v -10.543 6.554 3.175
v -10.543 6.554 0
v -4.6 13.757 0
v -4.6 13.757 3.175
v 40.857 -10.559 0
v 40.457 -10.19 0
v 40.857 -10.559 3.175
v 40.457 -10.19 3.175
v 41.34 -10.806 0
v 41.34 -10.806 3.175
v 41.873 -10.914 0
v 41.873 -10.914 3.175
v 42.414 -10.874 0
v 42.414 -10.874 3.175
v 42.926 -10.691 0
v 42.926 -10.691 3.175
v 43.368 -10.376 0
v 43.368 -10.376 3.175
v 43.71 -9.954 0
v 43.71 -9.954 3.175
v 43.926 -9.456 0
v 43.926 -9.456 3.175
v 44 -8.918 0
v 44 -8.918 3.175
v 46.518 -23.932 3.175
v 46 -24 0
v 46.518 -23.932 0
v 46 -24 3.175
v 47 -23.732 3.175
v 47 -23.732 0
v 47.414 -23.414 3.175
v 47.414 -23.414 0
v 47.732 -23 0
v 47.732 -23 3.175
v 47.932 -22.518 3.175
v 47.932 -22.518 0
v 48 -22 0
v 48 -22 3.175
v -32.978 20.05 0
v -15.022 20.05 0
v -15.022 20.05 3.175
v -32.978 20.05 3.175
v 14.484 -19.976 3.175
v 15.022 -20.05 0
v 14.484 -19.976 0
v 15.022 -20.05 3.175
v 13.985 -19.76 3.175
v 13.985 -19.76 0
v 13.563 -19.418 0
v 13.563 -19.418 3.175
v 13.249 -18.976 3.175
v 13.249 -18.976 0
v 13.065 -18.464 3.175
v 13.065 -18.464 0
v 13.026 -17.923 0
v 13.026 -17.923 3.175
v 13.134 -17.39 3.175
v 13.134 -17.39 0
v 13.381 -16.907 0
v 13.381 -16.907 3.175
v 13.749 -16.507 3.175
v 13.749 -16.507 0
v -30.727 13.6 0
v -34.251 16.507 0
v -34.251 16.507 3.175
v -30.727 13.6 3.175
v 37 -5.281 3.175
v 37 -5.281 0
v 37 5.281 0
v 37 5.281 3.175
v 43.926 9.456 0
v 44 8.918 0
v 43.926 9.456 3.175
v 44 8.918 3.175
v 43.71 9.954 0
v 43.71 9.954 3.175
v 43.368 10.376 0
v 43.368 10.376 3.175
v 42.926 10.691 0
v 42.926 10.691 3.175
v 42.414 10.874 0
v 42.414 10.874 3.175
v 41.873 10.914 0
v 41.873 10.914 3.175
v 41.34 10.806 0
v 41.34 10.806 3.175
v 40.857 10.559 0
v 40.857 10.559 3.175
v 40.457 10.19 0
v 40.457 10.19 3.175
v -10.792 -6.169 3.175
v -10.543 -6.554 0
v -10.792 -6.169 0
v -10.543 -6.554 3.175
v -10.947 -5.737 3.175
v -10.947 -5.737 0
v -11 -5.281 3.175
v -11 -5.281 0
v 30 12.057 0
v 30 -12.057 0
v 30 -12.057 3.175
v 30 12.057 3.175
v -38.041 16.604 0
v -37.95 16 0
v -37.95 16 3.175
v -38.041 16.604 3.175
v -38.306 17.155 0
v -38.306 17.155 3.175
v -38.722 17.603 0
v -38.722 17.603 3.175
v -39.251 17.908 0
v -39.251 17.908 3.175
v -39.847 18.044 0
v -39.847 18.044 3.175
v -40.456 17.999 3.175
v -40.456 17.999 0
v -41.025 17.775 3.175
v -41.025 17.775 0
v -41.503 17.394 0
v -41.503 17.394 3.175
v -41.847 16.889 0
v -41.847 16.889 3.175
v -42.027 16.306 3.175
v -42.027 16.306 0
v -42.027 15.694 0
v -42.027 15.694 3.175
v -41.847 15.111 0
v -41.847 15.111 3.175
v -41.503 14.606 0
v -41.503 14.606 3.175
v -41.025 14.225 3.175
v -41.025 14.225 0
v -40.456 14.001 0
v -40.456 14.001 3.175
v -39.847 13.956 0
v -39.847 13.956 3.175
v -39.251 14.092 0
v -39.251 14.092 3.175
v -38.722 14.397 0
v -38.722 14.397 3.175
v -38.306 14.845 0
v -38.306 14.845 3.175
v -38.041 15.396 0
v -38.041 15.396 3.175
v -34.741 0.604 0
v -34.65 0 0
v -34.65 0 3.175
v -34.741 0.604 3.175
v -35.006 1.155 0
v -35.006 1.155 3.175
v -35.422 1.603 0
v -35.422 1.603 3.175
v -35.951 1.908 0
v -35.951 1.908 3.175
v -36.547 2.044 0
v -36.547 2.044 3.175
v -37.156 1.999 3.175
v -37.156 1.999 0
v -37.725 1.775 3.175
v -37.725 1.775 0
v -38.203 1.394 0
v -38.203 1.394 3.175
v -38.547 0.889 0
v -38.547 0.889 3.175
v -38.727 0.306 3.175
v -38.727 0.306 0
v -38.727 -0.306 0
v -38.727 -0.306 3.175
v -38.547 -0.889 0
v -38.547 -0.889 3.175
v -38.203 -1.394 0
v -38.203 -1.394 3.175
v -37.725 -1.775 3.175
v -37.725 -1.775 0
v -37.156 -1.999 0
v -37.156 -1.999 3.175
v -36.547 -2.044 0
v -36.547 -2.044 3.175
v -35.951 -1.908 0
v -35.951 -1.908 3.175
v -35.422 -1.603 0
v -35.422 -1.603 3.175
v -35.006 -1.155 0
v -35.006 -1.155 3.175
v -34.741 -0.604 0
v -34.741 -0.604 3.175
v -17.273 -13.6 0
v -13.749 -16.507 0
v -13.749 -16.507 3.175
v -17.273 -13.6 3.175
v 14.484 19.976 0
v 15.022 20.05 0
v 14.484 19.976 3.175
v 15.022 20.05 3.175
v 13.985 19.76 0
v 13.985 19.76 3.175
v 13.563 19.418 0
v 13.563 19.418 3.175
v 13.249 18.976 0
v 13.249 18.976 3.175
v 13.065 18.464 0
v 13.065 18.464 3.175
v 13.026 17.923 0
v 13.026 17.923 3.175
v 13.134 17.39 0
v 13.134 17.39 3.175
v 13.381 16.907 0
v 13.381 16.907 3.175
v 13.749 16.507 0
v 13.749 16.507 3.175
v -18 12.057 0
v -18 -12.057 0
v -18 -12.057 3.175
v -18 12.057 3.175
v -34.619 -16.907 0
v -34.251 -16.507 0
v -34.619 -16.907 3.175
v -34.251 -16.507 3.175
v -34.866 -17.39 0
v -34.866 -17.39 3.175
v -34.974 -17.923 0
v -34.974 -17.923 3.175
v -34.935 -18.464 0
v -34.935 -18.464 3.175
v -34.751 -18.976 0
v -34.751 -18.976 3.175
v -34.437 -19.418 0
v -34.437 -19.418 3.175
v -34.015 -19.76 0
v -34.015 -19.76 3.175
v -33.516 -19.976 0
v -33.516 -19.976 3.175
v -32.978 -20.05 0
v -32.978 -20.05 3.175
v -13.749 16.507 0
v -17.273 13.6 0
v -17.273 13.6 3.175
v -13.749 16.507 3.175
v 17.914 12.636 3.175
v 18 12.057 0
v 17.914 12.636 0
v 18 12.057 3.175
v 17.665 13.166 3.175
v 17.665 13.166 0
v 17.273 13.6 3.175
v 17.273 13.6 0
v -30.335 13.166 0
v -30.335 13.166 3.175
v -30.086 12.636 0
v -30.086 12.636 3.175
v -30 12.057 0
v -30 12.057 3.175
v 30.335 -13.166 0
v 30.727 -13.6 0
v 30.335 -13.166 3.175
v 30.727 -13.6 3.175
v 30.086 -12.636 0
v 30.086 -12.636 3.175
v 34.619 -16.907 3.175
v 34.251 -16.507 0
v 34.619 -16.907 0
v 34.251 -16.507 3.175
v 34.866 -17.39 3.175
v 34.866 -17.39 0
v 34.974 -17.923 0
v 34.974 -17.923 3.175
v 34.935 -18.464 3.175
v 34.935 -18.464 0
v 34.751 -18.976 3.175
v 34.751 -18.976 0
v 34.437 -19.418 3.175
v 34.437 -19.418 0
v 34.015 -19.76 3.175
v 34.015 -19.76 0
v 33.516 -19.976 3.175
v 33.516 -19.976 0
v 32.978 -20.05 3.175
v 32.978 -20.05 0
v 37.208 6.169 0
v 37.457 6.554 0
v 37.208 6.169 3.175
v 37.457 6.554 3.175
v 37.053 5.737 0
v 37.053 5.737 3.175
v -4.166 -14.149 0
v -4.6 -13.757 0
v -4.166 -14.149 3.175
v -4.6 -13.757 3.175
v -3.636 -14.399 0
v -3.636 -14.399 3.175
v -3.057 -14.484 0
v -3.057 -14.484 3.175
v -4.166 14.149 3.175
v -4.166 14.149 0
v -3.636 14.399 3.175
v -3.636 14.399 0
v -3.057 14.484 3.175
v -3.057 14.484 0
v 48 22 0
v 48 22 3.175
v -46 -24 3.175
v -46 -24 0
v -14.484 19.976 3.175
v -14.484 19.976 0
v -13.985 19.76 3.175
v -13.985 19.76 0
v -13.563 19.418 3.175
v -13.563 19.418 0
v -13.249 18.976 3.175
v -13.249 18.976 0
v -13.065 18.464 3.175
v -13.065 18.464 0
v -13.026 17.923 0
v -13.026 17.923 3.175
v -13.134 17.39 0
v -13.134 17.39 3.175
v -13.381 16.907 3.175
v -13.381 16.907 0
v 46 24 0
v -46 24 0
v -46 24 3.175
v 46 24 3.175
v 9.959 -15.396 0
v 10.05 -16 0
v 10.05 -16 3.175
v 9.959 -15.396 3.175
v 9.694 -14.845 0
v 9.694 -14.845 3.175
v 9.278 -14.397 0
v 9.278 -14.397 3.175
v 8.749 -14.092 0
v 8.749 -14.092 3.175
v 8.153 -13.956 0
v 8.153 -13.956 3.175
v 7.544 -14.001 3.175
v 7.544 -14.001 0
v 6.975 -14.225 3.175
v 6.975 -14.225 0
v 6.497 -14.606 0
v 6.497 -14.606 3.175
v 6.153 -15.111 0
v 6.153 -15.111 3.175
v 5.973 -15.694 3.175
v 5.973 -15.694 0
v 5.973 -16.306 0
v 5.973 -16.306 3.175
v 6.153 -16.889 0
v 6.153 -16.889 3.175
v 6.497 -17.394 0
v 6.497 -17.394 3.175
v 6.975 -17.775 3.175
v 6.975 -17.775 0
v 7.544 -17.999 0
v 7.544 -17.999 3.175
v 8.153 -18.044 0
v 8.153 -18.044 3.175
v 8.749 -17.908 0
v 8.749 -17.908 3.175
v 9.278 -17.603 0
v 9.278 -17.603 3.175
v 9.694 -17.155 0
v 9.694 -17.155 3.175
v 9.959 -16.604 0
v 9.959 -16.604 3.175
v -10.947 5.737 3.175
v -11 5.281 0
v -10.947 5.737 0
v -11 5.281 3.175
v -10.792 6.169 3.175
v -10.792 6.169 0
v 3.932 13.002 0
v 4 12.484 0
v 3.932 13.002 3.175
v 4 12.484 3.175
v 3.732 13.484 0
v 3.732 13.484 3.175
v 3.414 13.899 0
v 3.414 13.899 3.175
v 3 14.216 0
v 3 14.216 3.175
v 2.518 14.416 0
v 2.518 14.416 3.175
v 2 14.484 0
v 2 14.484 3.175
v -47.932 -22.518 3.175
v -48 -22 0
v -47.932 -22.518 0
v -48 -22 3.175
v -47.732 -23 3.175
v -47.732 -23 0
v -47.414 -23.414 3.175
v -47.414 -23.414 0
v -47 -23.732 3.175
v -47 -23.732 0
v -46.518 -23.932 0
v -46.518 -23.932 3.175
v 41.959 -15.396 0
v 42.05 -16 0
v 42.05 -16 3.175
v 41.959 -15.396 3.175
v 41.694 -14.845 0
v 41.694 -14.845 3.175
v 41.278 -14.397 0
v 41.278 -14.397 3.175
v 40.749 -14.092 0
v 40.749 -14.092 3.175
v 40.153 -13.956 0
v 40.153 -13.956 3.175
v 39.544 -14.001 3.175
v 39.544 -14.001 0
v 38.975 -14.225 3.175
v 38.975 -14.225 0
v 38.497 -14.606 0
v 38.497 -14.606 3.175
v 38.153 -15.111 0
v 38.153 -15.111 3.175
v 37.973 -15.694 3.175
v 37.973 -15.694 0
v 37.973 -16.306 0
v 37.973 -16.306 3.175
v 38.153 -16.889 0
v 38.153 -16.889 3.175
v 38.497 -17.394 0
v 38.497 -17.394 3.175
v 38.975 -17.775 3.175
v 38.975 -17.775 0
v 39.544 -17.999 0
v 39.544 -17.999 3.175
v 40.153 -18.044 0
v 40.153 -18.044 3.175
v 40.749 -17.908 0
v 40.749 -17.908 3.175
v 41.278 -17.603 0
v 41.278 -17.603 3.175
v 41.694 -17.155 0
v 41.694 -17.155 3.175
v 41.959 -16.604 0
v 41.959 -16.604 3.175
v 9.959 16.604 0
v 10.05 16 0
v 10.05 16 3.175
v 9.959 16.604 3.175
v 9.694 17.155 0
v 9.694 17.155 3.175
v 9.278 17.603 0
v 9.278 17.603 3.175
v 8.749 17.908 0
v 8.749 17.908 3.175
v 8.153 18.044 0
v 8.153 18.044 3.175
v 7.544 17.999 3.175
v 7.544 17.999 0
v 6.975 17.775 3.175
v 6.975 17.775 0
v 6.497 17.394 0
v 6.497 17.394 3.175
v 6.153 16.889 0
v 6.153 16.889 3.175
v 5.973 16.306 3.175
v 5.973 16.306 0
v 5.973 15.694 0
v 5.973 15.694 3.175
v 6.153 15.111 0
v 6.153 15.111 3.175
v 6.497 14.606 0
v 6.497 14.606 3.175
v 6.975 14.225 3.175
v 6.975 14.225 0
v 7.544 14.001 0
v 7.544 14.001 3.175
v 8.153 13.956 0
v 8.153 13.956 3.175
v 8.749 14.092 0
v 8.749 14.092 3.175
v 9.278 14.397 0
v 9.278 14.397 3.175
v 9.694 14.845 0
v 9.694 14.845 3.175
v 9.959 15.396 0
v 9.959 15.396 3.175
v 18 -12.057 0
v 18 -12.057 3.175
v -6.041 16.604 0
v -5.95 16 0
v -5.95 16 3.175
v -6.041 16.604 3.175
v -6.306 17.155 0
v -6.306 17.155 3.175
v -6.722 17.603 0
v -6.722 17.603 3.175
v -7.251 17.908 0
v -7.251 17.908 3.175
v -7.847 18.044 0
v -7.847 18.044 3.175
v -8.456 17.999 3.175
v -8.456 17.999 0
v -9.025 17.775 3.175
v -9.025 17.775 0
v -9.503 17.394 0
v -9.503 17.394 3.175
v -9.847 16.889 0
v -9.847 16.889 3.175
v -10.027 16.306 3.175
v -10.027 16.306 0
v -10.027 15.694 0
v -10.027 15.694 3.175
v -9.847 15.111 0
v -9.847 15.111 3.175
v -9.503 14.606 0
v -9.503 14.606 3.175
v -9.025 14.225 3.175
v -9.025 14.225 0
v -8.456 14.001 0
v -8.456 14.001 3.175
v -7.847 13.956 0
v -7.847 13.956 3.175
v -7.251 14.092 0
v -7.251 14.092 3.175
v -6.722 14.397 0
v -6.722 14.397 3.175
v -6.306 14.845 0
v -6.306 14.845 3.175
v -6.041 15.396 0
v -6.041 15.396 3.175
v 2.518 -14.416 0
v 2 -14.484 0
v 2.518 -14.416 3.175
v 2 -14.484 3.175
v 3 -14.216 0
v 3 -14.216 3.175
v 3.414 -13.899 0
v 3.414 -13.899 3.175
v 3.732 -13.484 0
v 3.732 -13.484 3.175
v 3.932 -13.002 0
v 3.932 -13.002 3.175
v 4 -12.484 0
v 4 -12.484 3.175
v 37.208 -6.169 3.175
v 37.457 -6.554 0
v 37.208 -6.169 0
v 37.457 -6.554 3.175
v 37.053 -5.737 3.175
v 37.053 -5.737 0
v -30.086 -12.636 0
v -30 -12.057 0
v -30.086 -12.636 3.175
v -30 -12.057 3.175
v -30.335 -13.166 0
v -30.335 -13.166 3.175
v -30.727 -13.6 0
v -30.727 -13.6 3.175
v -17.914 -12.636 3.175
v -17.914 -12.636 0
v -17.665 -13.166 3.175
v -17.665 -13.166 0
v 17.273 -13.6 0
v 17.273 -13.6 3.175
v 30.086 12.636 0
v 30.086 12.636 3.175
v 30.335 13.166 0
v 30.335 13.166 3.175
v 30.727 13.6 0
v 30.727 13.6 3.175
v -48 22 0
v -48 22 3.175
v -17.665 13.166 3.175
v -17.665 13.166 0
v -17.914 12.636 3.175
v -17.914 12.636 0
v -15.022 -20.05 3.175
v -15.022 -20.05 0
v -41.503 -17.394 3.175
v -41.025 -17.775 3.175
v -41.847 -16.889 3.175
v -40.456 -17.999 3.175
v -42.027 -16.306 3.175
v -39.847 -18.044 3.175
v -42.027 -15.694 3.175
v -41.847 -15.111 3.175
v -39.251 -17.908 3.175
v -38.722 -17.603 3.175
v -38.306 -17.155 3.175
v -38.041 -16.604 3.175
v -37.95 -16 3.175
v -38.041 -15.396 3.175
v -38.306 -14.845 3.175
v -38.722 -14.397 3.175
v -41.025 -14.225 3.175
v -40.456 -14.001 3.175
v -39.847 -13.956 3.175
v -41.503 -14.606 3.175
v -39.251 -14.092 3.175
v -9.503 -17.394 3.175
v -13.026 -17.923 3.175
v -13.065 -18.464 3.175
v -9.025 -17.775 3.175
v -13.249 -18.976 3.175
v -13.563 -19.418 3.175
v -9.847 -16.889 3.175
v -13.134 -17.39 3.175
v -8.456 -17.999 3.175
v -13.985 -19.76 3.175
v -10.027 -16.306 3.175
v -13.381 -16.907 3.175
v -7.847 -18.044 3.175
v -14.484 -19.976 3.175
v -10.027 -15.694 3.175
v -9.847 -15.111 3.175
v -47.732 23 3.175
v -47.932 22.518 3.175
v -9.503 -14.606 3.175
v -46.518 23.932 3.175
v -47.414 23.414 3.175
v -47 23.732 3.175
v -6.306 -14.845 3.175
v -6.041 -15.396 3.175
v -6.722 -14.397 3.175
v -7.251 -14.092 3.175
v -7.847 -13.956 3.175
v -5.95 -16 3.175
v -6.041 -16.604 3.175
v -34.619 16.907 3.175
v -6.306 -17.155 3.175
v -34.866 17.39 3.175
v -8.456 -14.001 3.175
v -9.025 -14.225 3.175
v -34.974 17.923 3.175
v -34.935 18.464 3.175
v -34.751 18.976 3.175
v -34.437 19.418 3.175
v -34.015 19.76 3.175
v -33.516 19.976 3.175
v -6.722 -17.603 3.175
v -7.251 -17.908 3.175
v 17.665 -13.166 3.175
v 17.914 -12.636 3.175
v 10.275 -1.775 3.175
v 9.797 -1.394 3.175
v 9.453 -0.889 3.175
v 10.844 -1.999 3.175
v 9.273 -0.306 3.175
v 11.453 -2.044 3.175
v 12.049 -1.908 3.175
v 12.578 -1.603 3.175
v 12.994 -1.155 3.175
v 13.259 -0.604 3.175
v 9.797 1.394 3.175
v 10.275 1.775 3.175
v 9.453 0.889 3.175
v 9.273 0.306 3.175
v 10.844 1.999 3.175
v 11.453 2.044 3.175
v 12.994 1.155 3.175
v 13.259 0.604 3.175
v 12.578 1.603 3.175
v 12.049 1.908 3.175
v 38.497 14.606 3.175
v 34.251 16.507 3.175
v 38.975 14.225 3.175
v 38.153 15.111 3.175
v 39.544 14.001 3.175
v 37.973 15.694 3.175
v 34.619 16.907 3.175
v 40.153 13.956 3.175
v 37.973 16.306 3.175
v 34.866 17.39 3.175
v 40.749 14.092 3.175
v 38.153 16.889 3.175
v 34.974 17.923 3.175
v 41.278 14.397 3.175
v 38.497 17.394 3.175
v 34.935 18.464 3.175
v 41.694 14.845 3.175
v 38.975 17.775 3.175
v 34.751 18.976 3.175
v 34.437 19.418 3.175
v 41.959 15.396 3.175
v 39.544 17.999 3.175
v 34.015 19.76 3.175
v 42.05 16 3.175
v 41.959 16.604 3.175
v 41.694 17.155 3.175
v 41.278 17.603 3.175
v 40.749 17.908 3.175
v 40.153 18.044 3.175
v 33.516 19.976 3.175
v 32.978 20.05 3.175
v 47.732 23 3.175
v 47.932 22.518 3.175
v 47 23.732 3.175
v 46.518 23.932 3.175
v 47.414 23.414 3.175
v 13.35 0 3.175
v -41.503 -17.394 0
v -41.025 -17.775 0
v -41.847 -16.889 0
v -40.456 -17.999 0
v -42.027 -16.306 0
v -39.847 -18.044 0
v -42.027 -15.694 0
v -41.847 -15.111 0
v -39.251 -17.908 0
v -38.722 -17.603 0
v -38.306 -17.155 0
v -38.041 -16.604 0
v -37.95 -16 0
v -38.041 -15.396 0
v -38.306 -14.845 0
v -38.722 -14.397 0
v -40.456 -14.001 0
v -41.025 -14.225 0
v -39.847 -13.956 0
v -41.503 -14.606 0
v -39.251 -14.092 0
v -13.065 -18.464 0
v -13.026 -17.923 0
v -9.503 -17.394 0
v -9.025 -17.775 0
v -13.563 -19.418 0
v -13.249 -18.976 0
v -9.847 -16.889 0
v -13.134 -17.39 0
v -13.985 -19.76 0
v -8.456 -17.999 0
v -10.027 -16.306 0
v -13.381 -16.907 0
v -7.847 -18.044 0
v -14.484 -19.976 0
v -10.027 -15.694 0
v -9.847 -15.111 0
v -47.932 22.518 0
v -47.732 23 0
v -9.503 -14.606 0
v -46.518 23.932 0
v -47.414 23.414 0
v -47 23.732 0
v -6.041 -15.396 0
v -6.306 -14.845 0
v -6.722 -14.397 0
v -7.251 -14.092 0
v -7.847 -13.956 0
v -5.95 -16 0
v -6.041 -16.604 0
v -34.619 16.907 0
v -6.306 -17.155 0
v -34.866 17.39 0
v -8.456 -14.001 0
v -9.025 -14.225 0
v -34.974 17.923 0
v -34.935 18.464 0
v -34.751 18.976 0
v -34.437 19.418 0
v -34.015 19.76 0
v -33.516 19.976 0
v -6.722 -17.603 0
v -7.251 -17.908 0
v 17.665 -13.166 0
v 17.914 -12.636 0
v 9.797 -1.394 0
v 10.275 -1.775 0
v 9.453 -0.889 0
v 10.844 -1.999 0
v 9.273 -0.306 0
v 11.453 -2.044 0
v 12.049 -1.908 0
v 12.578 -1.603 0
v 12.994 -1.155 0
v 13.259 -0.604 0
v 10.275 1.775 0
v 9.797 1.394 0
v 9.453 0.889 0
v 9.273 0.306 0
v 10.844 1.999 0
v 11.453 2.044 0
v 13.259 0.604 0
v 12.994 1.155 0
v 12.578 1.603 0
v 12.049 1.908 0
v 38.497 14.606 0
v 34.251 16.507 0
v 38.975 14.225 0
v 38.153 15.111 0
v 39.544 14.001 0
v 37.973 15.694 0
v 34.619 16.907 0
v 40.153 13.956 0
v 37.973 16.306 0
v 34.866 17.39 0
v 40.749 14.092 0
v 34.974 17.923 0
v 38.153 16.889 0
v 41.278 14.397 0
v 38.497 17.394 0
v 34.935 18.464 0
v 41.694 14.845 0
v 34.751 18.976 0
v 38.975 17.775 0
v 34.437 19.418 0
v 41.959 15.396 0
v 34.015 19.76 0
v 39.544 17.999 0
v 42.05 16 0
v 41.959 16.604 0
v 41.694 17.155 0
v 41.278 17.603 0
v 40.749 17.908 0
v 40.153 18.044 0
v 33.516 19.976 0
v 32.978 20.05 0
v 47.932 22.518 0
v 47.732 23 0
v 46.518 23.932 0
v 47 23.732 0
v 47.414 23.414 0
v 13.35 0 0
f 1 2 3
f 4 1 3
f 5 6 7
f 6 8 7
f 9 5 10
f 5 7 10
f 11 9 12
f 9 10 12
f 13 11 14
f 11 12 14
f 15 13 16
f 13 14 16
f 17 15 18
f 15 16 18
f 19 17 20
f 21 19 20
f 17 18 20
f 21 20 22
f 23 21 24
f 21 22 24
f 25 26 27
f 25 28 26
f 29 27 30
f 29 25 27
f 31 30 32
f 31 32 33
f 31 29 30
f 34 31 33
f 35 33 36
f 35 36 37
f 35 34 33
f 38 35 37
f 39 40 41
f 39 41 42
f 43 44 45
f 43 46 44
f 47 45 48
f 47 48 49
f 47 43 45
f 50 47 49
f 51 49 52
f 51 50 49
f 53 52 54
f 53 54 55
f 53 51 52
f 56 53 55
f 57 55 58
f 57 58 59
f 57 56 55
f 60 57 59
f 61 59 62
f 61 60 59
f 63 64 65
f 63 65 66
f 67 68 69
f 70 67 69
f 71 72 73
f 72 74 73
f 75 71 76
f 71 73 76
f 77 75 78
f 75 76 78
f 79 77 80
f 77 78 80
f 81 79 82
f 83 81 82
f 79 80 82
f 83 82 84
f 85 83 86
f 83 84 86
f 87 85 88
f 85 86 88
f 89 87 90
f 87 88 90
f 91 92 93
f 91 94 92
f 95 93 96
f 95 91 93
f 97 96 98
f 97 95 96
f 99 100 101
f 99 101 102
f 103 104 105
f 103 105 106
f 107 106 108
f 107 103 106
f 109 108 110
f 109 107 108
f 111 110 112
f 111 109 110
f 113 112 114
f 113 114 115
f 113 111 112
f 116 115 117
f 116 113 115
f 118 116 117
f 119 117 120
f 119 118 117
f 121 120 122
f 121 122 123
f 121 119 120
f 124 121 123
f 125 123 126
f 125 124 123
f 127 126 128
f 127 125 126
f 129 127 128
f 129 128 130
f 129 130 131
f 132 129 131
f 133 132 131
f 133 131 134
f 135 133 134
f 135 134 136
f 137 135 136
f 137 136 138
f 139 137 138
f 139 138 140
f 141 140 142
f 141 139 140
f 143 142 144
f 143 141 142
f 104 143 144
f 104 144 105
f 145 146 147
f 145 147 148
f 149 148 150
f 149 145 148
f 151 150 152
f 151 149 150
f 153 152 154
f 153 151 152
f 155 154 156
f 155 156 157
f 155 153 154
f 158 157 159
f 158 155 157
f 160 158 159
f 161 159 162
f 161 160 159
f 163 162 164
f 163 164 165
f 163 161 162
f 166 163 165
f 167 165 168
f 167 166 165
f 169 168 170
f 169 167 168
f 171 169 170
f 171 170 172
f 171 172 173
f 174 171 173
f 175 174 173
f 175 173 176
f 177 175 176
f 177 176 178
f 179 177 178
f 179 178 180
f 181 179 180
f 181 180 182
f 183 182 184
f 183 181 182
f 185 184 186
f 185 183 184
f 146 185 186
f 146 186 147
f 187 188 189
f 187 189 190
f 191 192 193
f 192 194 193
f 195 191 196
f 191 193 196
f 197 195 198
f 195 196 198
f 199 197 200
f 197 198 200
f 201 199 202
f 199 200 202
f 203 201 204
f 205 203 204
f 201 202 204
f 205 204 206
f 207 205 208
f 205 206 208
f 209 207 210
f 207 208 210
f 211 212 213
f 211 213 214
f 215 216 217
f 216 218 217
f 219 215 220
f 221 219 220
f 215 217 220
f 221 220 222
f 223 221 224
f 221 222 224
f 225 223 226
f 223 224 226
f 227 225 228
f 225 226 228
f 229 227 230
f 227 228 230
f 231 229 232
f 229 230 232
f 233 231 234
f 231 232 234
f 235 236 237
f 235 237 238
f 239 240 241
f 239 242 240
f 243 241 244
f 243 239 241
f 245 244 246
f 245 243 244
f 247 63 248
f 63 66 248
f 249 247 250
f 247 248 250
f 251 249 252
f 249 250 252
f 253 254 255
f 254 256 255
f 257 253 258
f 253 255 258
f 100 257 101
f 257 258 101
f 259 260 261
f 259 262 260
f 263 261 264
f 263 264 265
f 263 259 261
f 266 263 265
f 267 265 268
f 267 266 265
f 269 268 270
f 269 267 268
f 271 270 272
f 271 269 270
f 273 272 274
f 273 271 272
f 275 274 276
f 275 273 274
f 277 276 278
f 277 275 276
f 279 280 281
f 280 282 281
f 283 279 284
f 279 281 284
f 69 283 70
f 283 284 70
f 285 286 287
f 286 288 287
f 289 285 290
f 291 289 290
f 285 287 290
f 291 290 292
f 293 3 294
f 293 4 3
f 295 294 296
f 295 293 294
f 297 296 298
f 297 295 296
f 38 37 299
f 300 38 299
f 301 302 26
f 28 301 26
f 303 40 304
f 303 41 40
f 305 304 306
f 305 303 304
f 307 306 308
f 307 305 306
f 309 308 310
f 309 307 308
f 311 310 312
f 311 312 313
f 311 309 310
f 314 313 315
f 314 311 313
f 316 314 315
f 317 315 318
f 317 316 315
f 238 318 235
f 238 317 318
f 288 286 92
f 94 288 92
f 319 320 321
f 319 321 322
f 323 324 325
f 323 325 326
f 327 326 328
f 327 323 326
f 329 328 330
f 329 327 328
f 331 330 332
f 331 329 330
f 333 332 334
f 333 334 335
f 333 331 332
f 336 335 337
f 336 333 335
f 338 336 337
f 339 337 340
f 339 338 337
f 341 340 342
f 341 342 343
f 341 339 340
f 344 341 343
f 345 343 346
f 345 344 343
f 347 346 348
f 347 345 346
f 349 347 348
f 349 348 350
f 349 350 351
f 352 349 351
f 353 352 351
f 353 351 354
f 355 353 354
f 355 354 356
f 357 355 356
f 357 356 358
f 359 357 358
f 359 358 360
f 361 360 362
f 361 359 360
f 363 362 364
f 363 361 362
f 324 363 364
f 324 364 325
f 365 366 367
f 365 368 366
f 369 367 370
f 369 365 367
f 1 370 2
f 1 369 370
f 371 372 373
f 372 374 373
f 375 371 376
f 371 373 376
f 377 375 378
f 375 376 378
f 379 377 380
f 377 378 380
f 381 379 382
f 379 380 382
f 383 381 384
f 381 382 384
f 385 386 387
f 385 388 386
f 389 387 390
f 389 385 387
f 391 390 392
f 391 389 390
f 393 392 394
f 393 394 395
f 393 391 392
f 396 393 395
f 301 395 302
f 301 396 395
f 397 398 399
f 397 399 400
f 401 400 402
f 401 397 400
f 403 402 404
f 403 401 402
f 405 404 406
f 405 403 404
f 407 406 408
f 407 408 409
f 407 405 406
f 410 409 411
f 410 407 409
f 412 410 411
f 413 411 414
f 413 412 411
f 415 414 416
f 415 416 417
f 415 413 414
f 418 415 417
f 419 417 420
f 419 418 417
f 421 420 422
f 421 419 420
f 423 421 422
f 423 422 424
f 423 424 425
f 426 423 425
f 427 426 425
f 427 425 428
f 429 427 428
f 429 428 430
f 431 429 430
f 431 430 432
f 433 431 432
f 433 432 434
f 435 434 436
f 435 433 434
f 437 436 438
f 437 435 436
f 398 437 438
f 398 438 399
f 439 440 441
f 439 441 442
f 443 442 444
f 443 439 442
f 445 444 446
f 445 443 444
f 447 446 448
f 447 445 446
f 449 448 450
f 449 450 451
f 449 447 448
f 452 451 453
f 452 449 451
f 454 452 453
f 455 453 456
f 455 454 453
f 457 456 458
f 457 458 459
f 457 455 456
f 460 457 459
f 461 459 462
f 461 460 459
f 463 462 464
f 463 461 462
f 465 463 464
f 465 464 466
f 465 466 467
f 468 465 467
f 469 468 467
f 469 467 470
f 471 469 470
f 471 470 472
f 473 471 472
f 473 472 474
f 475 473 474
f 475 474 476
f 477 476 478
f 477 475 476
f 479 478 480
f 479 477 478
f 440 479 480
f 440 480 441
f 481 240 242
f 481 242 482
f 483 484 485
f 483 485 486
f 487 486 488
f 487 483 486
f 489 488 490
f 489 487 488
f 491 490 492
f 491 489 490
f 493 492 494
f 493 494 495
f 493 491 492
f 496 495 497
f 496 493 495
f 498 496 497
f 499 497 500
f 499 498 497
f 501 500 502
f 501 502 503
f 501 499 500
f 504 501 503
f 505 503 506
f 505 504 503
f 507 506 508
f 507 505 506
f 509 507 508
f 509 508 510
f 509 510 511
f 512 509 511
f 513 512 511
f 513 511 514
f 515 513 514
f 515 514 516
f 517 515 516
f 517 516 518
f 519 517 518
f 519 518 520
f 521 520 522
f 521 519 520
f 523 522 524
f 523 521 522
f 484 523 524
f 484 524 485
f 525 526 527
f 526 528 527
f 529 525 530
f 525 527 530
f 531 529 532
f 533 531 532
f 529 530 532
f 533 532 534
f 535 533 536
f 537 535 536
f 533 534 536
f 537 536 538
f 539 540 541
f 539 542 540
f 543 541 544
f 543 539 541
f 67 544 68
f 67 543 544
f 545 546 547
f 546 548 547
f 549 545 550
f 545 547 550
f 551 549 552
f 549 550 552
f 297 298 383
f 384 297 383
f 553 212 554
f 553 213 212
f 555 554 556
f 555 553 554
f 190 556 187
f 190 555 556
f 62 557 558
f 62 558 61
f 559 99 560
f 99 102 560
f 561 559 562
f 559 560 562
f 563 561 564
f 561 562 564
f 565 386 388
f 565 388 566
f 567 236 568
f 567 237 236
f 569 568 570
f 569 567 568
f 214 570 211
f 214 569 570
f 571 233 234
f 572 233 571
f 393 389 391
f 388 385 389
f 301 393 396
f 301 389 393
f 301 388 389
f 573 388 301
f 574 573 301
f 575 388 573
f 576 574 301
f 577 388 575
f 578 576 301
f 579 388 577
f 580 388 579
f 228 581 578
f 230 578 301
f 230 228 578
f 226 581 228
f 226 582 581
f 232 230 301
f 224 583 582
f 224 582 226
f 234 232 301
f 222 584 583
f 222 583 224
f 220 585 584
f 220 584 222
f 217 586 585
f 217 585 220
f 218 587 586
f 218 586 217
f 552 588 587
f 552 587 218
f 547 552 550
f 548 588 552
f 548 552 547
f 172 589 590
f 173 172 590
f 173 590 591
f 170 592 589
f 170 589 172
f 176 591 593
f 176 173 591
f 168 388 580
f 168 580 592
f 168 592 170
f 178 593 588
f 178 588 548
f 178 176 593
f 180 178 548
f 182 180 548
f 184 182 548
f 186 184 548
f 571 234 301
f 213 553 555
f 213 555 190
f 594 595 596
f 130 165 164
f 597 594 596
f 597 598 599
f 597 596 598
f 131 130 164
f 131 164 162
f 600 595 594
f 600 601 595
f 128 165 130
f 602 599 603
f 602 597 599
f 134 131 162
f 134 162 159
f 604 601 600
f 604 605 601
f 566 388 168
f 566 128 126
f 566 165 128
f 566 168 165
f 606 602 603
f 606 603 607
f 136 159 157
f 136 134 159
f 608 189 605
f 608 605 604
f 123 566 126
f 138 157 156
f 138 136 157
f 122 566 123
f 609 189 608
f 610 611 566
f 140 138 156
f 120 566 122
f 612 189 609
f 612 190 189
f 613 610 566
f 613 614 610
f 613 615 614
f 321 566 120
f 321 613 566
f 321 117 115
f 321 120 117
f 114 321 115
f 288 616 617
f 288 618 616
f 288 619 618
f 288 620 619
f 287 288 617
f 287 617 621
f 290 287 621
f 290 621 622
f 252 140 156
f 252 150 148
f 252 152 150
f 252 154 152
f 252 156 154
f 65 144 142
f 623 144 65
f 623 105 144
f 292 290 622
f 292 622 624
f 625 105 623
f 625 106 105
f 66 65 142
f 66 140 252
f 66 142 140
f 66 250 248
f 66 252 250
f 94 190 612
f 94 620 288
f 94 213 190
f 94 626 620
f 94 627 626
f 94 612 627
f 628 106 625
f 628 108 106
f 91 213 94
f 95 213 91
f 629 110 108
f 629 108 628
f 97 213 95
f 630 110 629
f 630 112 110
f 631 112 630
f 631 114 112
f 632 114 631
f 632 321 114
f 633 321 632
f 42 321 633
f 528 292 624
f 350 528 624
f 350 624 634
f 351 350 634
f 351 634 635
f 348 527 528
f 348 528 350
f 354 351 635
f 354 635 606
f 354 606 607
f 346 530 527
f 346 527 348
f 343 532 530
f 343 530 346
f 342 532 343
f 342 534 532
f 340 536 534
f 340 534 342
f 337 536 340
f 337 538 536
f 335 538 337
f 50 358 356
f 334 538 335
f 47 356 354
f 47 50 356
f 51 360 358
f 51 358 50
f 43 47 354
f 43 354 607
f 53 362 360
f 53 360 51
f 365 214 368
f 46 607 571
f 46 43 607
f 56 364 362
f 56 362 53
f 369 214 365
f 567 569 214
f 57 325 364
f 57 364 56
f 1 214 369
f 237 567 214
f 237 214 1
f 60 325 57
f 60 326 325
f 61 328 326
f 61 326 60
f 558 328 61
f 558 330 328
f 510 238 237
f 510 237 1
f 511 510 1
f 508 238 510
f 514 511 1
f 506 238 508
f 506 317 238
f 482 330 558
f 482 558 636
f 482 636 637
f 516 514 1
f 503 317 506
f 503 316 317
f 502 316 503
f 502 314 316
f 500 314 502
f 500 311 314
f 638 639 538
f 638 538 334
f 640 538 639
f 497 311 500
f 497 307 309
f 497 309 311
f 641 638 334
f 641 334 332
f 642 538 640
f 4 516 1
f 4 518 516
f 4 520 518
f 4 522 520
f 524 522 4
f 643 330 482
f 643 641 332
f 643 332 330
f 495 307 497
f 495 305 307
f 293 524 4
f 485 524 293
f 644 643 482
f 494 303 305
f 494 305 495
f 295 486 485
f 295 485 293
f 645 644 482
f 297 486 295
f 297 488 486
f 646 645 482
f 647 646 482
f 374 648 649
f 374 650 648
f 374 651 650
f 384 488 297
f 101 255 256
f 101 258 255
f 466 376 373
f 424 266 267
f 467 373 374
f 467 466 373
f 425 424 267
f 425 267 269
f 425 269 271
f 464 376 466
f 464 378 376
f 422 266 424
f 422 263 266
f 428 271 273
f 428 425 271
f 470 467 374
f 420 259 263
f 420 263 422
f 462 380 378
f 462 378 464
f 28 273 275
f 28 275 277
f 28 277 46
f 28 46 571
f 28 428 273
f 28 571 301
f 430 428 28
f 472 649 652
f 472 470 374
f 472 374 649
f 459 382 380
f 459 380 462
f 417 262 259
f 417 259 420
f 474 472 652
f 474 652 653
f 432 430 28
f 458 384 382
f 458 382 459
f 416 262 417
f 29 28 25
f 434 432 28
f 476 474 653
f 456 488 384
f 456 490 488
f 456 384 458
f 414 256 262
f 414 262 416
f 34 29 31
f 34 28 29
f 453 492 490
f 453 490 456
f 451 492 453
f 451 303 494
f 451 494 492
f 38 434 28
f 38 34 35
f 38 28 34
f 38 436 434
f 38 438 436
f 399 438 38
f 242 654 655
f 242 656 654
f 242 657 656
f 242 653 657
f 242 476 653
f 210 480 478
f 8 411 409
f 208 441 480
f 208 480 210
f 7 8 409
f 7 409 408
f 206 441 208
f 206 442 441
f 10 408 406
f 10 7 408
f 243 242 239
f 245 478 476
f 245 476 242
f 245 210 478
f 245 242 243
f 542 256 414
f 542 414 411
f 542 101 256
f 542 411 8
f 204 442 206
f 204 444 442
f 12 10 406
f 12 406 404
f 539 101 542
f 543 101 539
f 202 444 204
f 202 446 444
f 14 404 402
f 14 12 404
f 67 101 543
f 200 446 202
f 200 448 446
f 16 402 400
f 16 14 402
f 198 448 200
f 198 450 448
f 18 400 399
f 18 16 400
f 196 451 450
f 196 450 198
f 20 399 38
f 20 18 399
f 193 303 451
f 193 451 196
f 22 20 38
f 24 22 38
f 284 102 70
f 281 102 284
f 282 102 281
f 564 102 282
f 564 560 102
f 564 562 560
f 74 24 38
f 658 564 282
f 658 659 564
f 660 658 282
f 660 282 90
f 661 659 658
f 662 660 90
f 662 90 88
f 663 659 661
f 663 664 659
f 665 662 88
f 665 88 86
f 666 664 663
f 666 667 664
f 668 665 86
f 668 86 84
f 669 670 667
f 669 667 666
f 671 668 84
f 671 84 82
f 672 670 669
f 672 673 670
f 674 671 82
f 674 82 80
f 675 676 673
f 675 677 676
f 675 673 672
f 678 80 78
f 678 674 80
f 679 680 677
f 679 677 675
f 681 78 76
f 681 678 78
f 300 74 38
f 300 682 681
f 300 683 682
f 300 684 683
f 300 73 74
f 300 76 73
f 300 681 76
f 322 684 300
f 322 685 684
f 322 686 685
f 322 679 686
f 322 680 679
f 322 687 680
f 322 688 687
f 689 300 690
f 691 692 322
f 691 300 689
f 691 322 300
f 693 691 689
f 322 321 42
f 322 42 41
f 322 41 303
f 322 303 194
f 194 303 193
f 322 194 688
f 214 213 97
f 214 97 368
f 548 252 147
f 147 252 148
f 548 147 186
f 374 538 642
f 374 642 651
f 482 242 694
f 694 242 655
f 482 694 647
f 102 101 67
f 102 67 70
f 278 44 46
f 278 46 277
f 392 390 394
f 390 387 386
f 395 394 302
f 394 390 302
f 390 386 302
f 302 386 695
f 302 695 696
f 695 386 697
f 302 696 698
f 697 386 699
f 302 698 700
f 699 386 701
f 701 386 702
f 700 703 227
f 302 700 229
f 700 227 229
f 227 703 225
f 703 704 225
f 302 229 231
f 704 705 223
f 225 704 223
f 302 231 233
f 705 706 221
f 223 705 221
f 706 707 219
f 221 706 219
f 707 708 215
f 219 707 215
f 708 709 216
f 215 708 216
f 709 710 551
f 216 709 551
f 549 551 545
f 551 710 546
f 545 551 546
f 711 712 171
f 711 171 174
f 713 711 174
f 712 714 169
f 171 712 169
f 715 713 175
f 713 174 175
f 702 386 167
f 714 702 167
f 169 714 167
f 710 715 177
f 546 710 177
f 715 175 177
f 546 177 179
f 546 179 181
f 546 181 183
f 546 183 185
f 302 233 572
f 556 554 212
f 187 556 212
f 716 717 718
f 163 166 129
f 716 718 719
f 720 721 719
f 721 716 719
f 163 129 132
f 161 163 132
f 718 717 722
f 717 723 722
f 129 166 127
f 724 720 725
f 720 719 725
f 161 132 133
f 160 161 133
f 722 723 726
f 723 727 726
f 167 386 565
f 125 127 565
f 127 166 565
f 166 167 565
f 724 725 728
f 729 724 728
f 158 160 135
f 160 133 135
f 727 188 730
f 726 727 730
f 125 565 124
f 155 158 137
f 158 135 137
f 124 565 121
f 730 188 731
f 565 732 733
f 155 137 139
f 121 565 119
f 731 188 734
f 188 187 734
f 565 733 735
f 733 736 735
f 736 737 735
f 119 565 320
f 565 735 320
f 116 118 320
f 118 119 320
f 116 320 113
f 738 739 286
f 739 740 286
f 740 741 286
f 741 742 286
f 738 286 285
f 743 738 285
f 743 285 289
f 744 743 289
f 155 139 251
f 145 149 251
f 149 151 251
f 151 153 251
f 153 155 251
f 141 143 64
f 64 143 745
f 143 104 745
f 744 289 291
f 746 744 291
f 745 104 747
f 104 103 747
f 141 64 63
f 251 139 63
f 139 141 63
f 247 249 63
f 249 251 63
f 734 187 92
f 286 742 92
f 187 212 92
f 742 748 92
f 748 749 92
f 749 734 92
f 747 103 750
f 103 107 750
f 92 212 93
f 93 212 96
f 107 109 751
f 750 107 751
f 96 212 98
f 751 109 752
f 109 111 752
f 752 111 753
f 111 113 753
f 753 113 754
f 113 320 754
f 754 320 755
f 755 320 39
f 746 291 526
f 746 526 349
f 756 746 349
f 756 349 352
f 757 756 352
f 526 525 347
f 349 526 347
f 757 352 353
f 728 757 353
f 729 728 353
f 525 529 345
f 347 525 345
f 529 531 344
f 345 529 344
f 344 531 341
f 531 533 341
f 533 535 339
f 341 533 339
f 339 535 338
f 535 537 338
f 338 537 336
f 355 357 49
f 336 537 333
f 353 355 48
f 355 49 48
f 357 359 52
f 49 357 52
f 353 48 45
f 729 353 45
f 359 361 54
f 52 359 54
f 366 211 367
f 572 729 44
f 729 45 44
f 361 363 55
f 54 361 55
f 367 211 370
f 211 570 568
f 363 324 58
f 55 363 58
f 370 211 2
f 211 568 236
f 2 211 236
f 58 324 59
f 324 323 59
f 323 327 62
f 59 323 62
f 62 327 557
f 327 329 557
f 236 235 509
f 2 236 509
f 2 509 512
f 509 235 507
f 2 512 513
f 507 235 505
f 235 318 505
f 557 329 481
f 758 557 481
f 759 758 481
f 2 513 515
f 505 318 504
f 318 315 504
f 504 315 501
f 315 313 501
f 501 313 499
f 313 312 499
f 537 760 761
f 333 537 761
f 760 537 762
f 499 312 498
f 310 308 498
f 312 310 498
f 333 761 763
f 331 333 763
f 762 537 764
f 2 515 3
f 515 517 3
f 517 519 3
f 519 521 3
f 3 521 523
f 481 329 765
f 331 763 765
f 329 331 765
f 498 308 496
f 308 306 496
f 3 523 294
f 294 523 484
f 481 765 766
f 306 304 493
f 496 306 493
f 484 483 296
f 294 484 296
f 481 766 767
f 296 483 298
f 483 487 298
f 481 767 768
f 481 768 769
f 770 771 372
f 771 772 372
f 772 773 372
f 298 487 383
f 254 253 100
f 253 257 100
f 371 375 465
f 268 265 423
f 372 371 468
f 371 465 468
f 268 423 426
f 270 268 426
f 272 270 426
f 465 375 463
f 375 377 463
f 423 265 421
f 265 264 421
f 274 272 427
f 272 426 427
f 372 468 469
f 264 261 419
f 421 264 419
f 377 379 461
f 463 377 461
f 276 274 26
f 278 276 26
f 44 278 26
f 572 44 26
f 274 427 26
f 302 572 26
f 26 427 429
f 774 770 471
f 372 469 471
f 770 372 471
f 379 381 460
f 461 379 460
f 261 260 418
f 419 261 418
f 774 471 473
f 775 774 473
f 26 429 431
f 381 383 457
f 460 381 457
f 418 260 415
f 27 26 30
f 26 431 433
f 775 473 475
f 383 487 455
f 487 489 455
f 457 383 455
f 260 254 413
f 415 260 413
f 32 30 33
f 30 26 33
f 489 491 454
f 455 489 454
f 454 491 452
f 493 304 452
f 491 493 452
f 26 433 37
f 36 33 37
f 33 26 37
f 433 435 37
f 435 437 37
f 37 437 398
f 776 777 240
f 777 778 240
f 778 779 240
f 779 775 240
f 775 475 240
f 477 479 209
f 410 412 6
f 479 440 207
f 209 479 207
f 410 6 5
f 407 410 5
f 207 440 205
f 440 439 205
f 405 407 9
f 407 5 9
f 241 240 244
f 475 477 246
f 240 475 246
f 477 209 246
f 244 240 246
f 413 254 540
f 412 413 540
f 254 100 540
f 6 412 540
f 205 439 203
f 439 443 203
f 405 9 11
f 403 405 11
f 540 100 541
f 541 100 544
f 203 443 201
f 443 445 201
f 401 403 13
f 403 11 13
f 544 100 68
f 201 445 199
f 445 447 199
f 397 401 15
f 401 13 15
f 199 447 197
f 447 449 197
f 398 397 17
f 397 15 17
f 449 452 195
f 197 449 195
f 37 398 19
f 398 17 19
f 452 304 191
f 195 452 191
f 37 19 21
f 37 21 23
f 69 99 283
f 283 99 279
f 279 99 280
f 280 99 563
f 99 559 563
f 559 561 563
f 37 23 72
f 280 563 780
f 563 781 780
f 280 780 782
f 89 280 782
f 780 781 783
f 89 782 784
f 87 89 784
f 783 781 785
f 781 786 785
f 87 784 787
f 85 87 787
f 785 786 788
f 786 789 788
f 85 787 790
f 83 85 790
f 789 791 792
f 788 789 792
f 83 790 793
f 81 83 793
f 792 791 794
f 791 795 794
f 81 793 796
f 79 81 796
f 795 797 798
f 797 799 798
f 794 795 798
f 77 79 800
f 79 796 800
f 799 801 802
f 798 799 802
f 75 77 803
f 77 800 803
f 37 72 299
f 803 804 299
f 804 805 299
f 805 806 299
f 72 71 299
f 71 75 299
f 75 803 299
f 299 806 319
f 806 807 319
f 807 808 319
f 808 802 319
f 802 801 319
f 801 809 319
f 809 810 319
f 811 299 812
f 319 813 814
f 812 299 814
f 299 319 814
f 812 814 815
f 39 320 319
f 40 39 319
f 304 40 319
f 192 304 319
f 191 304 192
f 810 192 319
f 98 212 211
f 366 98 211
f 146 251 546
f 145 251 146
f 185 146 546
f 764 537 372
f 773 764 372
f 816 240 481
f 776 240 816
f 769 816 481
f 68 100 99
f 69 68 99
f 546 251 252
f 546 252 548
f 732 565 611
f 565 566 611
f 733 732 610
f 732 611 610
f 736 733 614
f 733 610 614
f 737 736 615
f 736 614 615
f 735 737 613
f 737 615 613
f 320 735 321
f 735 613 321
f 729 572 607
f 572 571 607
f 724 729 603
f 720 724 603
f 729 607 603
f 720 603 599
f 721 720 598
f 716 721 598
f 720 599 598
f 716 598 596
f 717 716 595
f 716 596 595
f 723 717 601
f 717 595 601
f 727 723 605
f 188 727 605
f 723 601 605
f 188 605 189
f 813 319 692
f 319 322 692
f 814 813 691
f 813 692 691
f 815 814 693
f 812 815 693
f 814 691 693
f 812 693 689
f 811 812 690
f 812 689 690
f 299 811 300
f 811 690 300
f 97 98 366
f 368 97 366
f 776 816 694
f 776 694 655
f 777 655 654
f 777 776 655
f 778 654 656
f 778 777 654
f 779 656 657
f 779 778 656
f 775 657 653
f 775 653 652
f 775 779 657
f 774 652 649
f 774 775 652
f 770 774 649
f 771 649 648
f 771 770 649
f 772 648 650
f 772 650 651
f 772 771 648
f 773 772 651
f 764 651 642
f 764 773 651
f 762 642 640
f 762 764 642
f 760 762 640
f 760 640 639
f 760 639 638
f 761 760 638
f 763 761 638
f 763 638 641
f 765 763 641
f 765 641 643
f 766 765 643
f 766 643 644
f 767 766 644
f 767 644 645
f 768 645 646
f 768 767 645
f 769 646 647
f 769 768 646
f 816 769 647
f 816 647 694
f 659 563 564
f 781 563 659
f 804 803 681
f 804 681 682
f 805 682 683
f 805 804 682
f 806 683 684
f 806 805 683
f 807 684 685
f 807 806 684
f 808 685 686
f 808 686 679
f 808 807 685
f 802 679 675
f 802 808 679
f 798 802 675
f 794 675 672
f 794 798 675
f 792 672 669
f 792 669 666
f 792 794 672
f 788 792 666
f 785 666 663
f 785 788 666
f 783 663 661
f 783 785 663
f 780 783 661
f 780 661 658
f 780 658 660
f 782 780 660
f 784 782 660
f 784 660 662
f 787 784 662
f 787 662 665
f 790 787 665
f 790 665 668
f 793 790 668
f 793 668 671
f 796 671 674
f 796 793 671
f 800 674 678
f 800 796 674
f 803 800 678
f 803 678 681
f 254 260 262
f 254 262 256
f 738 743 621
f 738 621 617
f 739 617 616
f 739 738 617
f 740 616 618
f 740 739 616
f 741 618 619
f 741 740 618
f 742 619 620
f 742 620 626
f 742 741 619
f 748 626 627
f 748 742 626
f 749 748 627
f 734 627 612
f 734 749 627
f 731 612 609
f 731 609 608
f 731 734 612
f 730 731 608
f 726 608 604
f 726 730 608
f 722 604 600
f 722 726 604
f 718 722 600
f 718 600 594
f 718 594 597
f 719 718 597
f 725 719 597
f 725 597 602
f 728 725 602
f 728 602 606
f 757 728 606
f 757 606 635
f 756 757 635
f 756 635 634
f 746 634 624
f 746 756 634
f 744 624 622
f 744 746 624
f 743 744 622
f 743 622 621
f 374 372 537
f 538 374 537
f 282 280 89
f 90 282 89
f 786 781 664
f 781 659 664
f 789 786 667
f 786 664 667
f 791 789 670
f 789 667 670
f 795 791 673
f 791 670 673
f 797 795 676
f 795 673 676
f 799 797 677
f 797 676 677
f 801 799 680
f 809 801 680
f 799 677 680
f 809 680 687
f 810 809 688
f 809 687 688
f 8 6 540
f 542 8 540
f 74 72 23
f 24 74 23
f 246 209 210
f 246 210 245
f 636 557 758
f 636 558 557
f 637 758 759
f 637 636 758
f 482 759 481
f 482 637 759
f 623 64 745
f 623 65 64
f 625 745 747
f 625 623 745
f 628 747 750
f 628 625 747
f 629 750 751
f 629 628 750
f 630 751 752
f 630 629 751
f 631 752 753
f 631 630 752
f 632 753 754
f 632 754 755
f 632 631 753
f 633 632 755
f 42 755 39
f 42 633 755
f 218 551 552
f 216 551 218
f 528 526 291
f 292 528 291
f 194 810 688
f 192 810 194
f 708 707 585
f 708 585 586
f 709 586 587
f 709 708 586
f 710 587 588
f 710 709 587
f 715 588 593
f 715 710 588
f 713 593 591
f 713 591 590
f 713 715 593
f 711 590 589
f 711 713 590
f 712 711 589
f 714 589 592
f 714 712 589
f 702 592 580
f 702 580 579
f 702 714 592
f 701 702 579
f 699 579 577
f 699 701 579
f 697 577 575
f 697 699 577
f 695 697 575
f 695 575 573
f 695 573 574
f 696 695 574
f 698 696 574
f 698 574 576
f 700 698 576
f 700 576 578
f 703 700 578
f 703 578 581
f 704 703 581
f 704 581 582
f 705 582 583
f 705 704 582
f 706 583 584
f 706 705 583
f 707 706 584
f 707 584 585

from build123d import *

# Parameters (mm, degrees)
SKETCH1_W           = 96
SKETCH1_H           = 48
SKETCH1_R           = 2.05
BOSS_EXTRUDE1_DEPTH = 3.175
FILLET1_R           = 2


with BuildPart() as part:
    # Sketch1 → Boss-Extrude1 (new body)
    with BuildSketch(Plane.XY):
        Rectangle(SKETCH1_W, SKETCH1_H)
        with Locations((-40, 16)):
            Circle(SKETCH1_R, mode=Mode.SUBTRACT)
        with Locations((-8, 16)):
            Circle(SKETCH1_R, mode=Mode.SUBTRACT)
        with Locations((-8, -16)):
            Circle(SKETCH1_R, mode=Mode.SUBTRACT)
        with Locations((-40, -16)):
            Circle(SKETCH1_R, mode=Mode.SUBTRACT)
        with Locations((8, 16)):
            Circle(SKETCH1_R, mode=Mode.SUBTRACT)
        with Locations((8, -16)):
            Circle(SKETCH1_R, mode=Mode.SUBTRACT)
        with Locations((40, -16)):
            Circle(SKETCH1_R, mode=Mode.SUBTRACT)
        with Locations((40, 16)):
            Circle(SKETCH1_R, mode=Mode.SUBTRACT)
        with Locations((-36.7, 0)):
            Circle(SKETCH1_R, mode=Mode.SUBTRACT)
        with Locations((11.3, 0)):
            Circle(SKETCH1_R, mode=Mode.SUBTRACT)
        Polygon((-38.544929421, 20.05), (-30, 13), (-30, -13), (-38.544929421, -20.05), (-9.455070579, -20.05), (-18, -13), (-18, 13), (-9.455070579, 20.05), align=None, mode=Mode.SUBTRACT)
        Polygon((-11, -6), (-11, 6), (-4, 14.484327085), (4, 14.484327085), (4, -14.484327085), (-4, -14.484327085), align=None, mode=Mode.SUBTRACT)
        Polygon((38.544929421, -20.05), (30, -13), (30, 13), (38.544929421, 20.05), (9.455070579, 20.05), (18, 13), (18, -13), (9.455070579, -20.05), align=None, mode=Mode.SUBTRACT)
        Polygon((37, -6), (37, 6), (44, 14.484327085), (44, -14.484327085), align=None, mode=Mode.SUBTRACT)
    extrude(amount=BOSS_EXTRUDE1_DEPTH)

    # Fillet1
    fillet1_edges = [part.edges().sort_by_distance(p)[0] for p in [
        (-9.455070579, 20.05, 1.5875),
        (-38.544929421, 20.05, 1.5875),
        (-30, 13, 1.5875),
        (-30, -13, 1.5875),
        (-38.544929421, -20.05, 1.5875),
        (-9.455070579, -20.05, 1.5875),
        (-18, -13, 1.5875),
        (-18, 13, 1.5875),
        (38.544929421, 20.05, 1.5875),
        (9.455070579, 20.05, 1.5875),
        (18, 13, 1.5875),
        (18, -13, 1.5875),
        (9.455070579, -20.05, 1.5875),
        (38.544929421, -20.05, 1.5875),
        (30, -13, 1.5875),
        (30, 13, 1.5875),
        (-4, 14.484327085, 1.5875),
        (-11, 6, 1.5875),
        (-11, -6, 1.5875),
        (-4, -14.484327085, 1.5875),
        (4, -14.484327085, 1.5875),
        (4, 14.484327085, 1.5875),
        (37, -6, 1.5875),
        (44, -14.484327085, 1.5875),
        (44, 14.484327085, 1.5875),
        (37, 6, 1.5875),
        (-48, 24, 1.5875),
        (48, 24, 1.5875),
        (48, -24, 1.5875),
        (-48, -24, 1.5875),
    ]]
    fillet(fillet1_edges, radius=FILLET1_R)


solid = part.part
